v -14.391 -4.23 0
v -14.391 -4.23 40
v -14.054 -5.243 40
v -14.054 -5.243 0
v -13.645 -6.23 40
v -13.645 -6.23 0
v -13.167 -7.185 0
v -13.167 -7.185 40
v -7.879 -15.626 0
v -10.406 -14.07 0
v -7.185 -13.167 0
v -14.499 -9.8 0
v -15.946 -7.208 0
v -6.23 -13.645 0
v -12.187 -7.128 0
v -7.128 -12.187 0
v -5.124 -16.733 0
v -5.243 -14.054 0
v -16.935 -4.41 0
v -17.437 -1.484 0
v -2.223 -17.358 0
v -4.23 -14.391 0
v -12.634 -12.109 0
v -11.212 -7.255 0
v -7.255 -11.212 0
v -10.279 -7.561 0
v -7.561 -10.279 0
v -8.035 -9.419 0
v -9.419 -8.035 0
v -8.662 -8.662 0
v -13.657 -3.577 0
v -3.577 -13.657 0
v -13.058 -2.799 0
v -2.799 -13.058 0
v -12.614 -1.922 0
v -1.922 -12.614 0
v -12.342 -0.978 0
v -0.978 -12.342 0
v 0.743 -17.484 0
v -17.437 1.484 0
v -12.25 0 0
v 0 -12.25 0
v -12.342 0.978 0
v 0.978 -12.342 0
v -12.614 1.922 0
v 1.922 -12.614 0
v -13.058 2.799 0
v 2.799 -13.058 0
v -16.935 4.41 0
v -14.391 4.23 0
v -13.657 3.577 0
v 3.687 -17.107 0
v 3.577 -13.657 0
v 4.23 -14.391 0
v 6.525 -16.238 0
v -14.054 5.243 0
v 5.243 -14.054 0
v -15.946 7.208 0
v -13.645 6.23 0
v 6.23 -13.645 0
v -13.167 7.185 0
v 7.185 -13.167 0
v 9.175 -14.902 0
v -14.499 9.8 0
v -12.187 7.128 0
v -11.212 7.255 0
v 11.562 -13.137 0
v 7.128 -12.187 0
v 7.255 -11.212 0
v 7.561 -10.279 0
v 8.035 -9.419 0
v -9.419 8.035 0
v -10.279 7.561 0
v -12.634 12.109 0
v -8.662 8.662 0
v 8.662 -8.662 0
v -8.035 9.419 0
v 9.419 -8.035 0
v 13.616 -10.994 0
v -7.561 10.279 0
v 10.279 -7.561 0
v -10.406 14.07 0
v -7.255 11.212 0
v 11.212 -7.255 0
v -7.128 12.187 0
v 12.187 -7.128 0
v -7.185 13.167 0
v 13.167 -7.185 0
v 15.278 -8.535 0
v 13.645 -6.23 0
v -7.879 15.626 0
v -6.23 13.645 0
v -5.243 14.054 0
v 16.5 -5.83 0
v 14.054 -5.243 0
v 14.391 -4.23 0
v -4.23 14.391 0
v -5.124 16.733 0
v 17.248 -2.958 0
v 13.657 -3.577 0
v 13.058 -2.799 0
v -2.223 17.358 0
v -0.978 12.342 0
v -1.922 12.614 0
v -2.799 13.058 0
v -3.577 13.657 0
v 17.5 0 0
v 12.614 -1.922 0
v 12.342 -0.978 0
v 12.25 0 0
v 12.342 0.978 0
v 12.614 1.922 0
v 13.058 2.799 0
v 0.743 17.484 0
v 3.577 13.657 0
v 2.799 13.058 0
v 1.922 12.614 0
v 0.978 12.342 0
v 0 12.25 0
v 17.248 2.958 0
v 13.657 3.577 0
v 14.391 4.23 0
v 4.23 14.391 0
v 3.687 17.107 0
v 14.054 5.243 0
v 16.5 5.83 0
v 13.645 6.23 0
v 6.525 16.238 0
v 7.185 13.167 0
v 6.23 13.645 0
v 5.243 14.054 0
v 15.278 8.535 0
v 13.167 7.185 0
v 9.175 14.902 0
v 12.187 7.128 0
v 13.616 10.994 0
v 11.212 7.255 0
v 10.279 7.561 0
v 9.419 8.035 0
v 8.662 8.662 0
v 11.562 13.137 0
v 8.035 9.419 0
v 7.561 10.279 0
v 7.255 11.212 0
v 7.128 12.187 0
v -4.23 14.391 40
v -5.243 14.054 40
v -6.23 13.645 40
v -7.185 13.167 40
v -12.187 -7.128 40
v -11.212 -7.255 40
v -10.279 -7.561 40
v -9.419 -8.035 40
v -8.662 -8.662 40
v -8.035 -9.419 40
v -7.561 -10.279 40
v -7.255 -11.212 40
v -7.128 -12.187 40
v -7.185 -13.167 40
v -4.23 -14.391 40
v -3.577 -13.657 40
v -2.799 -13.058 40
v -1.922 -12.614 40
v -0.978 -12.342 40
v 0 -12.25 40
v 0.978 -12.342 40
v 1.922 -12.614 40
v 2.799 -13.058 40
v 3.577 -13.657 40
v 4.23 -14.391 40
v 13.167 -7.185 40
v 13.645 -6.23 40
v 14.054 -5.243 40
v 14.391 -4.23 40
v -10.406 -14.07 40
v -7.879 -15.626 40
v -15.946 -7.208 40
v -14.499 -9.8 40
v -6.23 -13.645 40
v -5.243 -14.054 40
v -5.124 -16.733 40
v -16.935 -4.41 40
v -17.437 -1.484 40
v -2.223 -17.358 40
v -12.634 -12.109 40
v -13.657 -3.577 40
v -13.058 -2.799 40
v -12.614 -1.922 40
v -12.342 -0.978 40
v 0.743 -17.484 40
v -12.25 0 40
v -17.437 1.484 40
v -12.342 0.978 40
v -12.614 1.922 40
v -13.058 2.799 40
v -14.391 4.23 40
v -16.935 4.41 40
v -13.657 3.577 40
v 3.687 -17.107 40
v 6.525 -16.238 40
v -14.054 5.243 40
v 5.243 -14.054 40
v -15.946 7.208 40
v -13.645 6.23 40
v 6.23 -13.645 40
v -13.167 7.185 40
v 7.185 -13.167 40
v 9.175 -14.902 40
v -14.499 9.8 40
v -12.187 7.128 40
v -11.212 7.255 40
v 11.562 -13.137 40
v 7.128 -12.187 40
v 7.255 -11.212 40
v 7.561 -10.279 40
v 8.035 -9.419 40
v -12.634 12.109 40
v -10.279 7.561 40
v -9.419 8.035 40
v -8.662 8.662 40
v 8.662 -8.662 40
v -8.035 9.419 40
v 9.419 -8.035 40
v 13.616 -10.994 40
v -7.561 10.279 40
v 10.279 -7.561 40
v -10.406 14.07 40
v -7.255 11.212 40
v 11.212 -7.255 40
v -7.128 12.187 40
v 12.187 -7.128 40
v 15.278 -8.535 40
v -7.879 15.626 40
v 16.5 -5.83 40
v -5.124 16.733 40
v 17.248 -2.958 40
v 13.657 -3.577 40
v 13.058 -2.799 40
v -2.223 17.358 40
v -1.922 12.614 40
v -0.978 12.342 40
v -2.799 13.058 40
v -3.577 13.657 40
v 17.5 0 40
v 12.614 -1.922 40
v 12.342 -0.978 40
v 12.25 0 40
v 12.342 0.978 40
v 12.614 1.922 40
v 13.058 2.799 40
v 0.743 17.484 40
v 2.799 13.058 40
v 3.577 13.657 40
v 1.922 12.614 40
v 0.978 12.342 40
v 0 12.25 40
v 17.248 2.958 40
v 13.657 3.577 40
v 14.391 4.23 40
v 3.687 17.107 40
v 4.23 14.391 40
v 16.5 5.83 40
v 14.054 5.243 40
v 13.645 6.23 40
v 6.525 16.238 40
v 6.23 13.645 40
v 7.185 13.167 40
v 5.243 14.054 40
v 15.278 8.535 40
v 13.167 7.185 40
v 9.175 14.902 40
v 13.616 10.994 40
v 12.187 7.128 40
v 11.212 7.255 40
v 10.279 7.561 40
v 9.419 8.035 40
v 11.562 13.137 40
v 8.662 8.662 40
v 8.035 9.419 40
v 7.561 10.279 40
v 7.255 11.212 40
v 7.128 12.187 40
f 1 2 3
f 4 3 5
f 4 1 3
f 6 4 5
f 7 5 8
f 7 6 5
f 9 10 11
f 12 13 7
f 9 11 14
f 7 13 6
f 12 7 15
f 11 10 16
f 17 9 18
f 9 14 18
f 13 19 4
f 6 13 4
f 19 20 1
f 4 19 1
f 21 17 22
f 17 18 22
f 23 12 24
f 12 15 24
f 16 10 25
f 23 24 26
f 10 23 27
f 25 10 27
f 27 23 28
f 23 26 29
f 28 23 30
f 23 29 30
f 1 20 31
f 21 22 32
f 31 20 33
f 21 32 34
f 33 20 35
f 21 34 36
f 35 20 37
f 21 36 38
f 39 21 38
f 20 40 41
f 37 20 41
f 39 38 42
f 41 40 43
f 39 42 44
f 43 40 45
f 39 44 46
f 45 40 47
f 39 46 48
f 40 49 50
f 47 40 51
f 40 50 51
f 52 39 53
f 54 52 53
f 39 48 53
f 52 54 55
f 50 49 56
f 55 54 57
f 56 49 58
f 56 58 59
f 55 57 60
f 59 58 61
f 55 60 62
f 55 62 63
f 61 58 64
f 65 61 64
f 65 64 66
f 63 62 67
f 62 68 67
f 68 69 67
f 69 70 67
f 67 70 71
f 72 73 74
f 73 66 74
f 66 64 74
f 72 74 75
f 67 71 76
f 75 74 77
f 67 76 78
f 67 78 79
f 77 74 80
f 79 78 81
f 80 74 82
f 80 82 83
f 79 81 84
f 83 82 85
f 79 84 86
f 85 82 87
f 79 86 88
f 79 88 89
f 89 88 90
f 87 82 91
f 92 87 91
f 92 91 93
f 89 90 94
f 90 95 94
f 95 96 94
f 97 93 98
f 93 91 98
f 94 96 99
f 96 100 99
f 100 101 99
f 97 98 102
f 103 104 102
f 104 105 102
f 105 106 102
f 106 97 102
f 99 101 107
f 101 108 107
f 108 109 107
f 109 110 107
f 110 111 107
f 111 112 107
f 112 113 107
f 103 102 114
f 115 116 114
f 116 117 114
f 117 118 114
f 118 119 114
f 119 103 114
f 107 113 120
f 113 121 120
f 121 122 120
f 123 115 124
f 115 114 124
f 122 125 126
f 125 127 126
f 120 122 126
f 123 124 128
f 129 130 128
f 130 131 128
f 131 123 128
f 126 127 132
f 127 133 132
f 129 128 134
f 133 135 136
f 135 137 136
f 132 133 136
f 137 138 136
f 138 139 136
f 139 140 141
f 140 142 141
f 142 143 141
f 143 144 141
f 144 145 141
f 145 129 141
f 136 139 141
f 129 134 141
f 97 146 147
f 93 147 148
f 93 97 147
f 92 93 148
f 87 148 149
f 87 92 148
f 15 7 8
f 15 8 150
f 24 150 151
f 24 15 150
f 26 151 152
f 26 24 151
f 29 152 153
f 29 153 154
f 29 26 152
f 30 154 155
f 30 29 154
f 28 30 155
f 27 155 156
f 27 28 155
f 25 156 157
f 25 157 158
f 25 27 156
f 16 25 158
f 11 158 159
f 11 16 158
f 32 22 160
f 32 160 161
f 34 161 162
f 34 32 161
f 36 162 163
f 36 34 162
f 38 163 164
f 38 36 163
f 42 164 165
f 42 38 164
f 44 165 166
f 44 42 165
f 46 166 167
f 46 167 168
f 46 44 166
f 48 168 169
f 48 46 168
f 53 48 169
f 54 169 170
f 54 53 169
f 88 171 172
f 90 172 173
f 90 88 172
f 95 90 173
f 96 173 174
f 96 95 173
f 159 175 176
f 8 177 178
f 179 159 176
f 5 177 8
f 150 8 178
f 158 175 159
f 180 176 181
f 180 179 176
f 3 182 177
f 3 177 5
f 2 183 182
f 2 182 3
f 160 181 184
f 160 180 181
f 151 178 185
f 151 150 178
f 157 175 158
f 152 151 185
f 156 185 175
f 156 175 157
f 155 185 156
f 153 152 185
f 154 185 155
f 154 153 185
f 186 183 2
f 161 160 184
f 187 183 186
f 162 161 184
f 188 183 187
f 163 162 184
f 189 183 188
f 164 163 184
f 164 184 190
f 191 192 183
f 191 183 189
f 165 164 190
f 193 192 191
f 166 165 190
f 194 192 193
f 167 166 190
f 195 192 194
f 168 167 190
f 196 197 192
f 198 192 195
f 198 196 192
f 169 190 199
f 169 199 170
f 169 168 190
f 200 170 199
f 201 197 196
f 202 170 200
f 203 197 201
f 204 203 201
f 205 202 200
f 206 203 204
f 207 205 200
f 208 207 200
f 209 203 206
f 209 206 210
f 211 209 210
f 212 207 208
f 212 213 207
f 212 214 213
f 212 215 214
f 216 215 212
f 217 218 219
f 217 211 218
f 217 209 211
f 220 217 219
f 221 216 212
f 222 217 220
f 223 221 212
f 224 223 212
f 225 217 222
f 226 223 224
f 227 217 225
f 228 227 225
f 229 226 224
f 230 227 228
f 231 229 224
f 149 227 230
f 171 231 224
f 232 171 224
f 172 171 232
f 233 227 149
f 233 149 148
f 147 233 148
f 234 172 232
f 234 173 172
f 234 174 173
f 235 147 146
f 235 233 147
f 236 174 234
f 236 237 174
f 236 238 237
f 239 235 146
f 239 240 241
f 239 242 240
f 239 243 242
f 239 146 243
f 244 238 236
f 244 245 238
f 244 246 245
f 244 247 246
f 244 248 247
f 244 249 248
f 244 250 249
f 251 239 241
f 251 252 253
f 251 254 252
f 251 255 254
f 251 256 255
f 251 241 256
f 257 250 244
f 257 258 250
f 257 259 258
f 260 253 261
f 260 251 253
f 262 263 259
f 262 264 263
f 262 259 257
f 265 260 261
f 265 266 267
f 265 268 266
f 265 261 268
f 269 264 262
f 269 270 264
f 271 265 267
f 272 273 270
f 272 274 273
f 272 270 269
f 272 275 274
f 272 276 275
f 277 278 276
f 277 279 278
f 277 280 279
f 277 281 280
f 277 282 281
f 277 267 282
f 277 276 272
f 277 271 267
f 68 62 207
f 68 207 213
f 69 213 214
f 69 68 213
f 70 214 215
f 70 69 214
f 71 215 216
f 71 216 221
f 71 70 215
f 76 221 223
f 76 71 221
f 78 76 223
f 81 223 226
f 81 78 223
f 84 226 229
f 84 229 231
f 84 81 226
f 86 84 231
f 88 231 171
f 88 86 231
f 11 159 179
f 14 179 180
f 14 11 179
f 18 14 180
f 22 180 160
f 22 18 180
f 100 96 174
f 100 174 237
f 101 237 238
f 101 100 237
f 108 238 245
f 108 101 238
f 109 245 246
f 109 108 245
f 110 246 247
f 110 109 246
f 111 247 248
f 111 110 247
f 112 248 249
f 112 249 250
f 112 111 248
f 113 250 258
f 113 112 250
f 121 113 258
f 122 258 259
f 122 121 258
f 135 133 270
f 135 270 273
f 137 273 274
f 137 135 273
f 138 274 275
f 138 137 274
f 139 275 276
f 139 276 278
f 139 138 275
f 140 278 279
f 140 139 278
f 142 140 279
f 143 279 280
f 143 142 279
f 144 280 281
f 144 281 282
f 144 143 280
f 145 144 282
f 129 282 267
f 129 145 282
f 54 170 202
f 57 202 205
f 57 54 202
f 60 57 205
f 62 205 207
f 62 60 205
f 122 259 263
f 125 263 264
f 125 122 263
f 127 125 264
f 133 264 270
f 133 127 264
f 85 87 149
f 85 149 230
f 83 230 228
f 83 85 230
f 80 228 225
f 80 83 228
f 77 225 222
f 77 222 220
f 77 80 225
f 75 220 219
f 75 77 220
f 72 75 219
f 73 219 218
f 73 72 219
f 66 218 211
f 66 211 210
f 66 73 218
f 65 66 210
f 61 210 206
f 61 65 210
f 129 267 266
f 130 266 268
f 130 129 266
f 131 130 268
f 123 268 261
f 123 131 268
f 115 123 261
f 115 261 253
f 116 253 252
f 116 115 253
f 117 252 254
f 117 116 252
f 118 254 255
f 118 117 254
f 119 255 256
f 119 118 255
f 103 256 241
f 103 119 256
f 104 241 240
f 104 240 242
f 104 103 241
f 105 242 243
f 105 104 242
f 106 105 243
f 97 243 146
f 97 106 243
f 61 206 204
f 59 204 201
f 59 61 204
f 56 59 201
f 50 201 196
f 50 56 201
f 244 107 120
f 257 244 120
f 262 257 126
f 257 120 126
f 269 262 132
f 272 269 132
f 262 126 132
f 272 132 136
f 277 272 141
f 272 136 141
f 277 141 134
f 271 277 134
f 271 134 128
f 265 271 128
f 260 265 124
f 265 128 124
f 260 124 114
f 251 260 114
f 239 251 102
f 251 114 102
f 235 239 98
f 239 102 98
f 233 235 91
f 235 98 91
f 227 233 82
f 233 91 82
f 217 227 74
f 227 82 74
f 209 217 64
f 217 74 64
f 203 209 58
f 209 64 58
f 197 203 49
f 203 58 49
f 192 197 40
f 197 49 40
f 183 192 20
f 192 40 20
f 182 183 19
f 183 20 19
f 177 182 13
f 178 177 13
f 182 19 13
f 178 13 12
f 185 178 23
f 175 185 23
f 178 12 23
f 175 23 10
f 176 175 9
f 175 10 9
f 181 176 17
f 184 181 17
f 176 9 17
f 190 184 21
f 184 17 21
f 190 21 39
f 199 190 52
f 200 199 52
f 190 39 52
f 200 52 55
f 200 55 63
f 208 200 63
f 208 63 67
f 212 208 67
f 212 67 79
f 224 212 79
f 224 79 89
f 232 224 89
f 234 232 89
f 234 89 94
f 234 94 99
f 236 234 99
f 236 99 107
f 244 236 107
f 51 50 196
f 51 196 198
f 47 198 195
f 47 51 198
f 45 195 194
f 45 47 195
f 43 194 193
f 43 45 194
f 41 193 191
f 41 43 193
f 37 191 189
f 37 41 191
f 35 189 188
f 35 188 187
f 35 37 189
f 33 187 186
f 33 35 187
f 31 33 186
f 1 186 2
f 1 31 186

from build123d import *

# Parameters (mm, degrees)
SKETCH1_R           = 17.5
BOSS_EXTRUDE1_DEPTH = 40


with BuildPart() as part:
    # Sketch1 → Boss-Extrude1 (new body)
    with BuildSketch(Plane.XY):
        Circle(SKETCH1_R)
        with BuildLine():
            ThreePointArc((-13.167433825, 7.184614567), (-13.858192988, 5.740251485), (-14.391071429, 4.230492068))
            ThreePointArc((-14.391071429, 4.230492068), (-12.25, 0), (-14.391071429, -4.230492068))
            ThreePointArc((-14.391071429, -4.230492068), (-13.858192988, -5.740251485), (-13.167433825, -7.184614567))
            ThreePointArc((-13.167433825, -7.184614567), (-8.66205807, -8.66205807), (-7.184614567, -13.167433825))
            ThreePointArc((-7.184614567, -13.167433825), (-5.740251485, -13.858192988), (-4.230492068, -14.391071429))
            ThreePointArc((-4.230492068, -14.391071429), (0, -12.25), (4.230492068, -14.391071429))
            ThreePointArc((4.230492068, -14.391071429), (5.740251485, -13.858192988), (7.184614567, -13.167433825))
            ThreePointArc((7.184614567, -13.167433825), (8.66205807, -8.66205807), (13.167433825, -7.184614567))
            ThreePointArc((13.167433825, -7.184614567), (13.858192988, -5.740251485), (14.391071429, -4.230492068))
            ThreePointArc((14.391071429, -4.230492068), (12.25, 0), (14.391071429, 4.230492068))
            ThreePointArc((14.391071429, 4.230492068), (13.858192988, 5.740251485), (13.167433825, 7.184614567))
            ThreePointArc((13.167433825, 7.184614567), (8.66205807, 8.66205807), (7.184614567, 13.167433825))
            ThreePointArc((7.184614567, 13.167433825), (5.740251485, 13.858192988), (4.230492068, 14.391071429))
            ThreePointArc((4.230492068, 14.391071429), (0, 12.25), (-4.230492068, 14.391071429))
            ThreePointArc((-4.230492068, 14.391071429), (-5.740251485, 13.858192988), (-7.184614567, 13.167433825))
            ThreePointArc((-7.184614567, 13.167433825), (-8.66205807, 8.66205807), (-13.167433825, 7.184614567))
        make_face(mode=Mode.SUBTRACT)
    extrude(amount=BOSS_EXTRUDE1_DEPTH)


solid = part.part
